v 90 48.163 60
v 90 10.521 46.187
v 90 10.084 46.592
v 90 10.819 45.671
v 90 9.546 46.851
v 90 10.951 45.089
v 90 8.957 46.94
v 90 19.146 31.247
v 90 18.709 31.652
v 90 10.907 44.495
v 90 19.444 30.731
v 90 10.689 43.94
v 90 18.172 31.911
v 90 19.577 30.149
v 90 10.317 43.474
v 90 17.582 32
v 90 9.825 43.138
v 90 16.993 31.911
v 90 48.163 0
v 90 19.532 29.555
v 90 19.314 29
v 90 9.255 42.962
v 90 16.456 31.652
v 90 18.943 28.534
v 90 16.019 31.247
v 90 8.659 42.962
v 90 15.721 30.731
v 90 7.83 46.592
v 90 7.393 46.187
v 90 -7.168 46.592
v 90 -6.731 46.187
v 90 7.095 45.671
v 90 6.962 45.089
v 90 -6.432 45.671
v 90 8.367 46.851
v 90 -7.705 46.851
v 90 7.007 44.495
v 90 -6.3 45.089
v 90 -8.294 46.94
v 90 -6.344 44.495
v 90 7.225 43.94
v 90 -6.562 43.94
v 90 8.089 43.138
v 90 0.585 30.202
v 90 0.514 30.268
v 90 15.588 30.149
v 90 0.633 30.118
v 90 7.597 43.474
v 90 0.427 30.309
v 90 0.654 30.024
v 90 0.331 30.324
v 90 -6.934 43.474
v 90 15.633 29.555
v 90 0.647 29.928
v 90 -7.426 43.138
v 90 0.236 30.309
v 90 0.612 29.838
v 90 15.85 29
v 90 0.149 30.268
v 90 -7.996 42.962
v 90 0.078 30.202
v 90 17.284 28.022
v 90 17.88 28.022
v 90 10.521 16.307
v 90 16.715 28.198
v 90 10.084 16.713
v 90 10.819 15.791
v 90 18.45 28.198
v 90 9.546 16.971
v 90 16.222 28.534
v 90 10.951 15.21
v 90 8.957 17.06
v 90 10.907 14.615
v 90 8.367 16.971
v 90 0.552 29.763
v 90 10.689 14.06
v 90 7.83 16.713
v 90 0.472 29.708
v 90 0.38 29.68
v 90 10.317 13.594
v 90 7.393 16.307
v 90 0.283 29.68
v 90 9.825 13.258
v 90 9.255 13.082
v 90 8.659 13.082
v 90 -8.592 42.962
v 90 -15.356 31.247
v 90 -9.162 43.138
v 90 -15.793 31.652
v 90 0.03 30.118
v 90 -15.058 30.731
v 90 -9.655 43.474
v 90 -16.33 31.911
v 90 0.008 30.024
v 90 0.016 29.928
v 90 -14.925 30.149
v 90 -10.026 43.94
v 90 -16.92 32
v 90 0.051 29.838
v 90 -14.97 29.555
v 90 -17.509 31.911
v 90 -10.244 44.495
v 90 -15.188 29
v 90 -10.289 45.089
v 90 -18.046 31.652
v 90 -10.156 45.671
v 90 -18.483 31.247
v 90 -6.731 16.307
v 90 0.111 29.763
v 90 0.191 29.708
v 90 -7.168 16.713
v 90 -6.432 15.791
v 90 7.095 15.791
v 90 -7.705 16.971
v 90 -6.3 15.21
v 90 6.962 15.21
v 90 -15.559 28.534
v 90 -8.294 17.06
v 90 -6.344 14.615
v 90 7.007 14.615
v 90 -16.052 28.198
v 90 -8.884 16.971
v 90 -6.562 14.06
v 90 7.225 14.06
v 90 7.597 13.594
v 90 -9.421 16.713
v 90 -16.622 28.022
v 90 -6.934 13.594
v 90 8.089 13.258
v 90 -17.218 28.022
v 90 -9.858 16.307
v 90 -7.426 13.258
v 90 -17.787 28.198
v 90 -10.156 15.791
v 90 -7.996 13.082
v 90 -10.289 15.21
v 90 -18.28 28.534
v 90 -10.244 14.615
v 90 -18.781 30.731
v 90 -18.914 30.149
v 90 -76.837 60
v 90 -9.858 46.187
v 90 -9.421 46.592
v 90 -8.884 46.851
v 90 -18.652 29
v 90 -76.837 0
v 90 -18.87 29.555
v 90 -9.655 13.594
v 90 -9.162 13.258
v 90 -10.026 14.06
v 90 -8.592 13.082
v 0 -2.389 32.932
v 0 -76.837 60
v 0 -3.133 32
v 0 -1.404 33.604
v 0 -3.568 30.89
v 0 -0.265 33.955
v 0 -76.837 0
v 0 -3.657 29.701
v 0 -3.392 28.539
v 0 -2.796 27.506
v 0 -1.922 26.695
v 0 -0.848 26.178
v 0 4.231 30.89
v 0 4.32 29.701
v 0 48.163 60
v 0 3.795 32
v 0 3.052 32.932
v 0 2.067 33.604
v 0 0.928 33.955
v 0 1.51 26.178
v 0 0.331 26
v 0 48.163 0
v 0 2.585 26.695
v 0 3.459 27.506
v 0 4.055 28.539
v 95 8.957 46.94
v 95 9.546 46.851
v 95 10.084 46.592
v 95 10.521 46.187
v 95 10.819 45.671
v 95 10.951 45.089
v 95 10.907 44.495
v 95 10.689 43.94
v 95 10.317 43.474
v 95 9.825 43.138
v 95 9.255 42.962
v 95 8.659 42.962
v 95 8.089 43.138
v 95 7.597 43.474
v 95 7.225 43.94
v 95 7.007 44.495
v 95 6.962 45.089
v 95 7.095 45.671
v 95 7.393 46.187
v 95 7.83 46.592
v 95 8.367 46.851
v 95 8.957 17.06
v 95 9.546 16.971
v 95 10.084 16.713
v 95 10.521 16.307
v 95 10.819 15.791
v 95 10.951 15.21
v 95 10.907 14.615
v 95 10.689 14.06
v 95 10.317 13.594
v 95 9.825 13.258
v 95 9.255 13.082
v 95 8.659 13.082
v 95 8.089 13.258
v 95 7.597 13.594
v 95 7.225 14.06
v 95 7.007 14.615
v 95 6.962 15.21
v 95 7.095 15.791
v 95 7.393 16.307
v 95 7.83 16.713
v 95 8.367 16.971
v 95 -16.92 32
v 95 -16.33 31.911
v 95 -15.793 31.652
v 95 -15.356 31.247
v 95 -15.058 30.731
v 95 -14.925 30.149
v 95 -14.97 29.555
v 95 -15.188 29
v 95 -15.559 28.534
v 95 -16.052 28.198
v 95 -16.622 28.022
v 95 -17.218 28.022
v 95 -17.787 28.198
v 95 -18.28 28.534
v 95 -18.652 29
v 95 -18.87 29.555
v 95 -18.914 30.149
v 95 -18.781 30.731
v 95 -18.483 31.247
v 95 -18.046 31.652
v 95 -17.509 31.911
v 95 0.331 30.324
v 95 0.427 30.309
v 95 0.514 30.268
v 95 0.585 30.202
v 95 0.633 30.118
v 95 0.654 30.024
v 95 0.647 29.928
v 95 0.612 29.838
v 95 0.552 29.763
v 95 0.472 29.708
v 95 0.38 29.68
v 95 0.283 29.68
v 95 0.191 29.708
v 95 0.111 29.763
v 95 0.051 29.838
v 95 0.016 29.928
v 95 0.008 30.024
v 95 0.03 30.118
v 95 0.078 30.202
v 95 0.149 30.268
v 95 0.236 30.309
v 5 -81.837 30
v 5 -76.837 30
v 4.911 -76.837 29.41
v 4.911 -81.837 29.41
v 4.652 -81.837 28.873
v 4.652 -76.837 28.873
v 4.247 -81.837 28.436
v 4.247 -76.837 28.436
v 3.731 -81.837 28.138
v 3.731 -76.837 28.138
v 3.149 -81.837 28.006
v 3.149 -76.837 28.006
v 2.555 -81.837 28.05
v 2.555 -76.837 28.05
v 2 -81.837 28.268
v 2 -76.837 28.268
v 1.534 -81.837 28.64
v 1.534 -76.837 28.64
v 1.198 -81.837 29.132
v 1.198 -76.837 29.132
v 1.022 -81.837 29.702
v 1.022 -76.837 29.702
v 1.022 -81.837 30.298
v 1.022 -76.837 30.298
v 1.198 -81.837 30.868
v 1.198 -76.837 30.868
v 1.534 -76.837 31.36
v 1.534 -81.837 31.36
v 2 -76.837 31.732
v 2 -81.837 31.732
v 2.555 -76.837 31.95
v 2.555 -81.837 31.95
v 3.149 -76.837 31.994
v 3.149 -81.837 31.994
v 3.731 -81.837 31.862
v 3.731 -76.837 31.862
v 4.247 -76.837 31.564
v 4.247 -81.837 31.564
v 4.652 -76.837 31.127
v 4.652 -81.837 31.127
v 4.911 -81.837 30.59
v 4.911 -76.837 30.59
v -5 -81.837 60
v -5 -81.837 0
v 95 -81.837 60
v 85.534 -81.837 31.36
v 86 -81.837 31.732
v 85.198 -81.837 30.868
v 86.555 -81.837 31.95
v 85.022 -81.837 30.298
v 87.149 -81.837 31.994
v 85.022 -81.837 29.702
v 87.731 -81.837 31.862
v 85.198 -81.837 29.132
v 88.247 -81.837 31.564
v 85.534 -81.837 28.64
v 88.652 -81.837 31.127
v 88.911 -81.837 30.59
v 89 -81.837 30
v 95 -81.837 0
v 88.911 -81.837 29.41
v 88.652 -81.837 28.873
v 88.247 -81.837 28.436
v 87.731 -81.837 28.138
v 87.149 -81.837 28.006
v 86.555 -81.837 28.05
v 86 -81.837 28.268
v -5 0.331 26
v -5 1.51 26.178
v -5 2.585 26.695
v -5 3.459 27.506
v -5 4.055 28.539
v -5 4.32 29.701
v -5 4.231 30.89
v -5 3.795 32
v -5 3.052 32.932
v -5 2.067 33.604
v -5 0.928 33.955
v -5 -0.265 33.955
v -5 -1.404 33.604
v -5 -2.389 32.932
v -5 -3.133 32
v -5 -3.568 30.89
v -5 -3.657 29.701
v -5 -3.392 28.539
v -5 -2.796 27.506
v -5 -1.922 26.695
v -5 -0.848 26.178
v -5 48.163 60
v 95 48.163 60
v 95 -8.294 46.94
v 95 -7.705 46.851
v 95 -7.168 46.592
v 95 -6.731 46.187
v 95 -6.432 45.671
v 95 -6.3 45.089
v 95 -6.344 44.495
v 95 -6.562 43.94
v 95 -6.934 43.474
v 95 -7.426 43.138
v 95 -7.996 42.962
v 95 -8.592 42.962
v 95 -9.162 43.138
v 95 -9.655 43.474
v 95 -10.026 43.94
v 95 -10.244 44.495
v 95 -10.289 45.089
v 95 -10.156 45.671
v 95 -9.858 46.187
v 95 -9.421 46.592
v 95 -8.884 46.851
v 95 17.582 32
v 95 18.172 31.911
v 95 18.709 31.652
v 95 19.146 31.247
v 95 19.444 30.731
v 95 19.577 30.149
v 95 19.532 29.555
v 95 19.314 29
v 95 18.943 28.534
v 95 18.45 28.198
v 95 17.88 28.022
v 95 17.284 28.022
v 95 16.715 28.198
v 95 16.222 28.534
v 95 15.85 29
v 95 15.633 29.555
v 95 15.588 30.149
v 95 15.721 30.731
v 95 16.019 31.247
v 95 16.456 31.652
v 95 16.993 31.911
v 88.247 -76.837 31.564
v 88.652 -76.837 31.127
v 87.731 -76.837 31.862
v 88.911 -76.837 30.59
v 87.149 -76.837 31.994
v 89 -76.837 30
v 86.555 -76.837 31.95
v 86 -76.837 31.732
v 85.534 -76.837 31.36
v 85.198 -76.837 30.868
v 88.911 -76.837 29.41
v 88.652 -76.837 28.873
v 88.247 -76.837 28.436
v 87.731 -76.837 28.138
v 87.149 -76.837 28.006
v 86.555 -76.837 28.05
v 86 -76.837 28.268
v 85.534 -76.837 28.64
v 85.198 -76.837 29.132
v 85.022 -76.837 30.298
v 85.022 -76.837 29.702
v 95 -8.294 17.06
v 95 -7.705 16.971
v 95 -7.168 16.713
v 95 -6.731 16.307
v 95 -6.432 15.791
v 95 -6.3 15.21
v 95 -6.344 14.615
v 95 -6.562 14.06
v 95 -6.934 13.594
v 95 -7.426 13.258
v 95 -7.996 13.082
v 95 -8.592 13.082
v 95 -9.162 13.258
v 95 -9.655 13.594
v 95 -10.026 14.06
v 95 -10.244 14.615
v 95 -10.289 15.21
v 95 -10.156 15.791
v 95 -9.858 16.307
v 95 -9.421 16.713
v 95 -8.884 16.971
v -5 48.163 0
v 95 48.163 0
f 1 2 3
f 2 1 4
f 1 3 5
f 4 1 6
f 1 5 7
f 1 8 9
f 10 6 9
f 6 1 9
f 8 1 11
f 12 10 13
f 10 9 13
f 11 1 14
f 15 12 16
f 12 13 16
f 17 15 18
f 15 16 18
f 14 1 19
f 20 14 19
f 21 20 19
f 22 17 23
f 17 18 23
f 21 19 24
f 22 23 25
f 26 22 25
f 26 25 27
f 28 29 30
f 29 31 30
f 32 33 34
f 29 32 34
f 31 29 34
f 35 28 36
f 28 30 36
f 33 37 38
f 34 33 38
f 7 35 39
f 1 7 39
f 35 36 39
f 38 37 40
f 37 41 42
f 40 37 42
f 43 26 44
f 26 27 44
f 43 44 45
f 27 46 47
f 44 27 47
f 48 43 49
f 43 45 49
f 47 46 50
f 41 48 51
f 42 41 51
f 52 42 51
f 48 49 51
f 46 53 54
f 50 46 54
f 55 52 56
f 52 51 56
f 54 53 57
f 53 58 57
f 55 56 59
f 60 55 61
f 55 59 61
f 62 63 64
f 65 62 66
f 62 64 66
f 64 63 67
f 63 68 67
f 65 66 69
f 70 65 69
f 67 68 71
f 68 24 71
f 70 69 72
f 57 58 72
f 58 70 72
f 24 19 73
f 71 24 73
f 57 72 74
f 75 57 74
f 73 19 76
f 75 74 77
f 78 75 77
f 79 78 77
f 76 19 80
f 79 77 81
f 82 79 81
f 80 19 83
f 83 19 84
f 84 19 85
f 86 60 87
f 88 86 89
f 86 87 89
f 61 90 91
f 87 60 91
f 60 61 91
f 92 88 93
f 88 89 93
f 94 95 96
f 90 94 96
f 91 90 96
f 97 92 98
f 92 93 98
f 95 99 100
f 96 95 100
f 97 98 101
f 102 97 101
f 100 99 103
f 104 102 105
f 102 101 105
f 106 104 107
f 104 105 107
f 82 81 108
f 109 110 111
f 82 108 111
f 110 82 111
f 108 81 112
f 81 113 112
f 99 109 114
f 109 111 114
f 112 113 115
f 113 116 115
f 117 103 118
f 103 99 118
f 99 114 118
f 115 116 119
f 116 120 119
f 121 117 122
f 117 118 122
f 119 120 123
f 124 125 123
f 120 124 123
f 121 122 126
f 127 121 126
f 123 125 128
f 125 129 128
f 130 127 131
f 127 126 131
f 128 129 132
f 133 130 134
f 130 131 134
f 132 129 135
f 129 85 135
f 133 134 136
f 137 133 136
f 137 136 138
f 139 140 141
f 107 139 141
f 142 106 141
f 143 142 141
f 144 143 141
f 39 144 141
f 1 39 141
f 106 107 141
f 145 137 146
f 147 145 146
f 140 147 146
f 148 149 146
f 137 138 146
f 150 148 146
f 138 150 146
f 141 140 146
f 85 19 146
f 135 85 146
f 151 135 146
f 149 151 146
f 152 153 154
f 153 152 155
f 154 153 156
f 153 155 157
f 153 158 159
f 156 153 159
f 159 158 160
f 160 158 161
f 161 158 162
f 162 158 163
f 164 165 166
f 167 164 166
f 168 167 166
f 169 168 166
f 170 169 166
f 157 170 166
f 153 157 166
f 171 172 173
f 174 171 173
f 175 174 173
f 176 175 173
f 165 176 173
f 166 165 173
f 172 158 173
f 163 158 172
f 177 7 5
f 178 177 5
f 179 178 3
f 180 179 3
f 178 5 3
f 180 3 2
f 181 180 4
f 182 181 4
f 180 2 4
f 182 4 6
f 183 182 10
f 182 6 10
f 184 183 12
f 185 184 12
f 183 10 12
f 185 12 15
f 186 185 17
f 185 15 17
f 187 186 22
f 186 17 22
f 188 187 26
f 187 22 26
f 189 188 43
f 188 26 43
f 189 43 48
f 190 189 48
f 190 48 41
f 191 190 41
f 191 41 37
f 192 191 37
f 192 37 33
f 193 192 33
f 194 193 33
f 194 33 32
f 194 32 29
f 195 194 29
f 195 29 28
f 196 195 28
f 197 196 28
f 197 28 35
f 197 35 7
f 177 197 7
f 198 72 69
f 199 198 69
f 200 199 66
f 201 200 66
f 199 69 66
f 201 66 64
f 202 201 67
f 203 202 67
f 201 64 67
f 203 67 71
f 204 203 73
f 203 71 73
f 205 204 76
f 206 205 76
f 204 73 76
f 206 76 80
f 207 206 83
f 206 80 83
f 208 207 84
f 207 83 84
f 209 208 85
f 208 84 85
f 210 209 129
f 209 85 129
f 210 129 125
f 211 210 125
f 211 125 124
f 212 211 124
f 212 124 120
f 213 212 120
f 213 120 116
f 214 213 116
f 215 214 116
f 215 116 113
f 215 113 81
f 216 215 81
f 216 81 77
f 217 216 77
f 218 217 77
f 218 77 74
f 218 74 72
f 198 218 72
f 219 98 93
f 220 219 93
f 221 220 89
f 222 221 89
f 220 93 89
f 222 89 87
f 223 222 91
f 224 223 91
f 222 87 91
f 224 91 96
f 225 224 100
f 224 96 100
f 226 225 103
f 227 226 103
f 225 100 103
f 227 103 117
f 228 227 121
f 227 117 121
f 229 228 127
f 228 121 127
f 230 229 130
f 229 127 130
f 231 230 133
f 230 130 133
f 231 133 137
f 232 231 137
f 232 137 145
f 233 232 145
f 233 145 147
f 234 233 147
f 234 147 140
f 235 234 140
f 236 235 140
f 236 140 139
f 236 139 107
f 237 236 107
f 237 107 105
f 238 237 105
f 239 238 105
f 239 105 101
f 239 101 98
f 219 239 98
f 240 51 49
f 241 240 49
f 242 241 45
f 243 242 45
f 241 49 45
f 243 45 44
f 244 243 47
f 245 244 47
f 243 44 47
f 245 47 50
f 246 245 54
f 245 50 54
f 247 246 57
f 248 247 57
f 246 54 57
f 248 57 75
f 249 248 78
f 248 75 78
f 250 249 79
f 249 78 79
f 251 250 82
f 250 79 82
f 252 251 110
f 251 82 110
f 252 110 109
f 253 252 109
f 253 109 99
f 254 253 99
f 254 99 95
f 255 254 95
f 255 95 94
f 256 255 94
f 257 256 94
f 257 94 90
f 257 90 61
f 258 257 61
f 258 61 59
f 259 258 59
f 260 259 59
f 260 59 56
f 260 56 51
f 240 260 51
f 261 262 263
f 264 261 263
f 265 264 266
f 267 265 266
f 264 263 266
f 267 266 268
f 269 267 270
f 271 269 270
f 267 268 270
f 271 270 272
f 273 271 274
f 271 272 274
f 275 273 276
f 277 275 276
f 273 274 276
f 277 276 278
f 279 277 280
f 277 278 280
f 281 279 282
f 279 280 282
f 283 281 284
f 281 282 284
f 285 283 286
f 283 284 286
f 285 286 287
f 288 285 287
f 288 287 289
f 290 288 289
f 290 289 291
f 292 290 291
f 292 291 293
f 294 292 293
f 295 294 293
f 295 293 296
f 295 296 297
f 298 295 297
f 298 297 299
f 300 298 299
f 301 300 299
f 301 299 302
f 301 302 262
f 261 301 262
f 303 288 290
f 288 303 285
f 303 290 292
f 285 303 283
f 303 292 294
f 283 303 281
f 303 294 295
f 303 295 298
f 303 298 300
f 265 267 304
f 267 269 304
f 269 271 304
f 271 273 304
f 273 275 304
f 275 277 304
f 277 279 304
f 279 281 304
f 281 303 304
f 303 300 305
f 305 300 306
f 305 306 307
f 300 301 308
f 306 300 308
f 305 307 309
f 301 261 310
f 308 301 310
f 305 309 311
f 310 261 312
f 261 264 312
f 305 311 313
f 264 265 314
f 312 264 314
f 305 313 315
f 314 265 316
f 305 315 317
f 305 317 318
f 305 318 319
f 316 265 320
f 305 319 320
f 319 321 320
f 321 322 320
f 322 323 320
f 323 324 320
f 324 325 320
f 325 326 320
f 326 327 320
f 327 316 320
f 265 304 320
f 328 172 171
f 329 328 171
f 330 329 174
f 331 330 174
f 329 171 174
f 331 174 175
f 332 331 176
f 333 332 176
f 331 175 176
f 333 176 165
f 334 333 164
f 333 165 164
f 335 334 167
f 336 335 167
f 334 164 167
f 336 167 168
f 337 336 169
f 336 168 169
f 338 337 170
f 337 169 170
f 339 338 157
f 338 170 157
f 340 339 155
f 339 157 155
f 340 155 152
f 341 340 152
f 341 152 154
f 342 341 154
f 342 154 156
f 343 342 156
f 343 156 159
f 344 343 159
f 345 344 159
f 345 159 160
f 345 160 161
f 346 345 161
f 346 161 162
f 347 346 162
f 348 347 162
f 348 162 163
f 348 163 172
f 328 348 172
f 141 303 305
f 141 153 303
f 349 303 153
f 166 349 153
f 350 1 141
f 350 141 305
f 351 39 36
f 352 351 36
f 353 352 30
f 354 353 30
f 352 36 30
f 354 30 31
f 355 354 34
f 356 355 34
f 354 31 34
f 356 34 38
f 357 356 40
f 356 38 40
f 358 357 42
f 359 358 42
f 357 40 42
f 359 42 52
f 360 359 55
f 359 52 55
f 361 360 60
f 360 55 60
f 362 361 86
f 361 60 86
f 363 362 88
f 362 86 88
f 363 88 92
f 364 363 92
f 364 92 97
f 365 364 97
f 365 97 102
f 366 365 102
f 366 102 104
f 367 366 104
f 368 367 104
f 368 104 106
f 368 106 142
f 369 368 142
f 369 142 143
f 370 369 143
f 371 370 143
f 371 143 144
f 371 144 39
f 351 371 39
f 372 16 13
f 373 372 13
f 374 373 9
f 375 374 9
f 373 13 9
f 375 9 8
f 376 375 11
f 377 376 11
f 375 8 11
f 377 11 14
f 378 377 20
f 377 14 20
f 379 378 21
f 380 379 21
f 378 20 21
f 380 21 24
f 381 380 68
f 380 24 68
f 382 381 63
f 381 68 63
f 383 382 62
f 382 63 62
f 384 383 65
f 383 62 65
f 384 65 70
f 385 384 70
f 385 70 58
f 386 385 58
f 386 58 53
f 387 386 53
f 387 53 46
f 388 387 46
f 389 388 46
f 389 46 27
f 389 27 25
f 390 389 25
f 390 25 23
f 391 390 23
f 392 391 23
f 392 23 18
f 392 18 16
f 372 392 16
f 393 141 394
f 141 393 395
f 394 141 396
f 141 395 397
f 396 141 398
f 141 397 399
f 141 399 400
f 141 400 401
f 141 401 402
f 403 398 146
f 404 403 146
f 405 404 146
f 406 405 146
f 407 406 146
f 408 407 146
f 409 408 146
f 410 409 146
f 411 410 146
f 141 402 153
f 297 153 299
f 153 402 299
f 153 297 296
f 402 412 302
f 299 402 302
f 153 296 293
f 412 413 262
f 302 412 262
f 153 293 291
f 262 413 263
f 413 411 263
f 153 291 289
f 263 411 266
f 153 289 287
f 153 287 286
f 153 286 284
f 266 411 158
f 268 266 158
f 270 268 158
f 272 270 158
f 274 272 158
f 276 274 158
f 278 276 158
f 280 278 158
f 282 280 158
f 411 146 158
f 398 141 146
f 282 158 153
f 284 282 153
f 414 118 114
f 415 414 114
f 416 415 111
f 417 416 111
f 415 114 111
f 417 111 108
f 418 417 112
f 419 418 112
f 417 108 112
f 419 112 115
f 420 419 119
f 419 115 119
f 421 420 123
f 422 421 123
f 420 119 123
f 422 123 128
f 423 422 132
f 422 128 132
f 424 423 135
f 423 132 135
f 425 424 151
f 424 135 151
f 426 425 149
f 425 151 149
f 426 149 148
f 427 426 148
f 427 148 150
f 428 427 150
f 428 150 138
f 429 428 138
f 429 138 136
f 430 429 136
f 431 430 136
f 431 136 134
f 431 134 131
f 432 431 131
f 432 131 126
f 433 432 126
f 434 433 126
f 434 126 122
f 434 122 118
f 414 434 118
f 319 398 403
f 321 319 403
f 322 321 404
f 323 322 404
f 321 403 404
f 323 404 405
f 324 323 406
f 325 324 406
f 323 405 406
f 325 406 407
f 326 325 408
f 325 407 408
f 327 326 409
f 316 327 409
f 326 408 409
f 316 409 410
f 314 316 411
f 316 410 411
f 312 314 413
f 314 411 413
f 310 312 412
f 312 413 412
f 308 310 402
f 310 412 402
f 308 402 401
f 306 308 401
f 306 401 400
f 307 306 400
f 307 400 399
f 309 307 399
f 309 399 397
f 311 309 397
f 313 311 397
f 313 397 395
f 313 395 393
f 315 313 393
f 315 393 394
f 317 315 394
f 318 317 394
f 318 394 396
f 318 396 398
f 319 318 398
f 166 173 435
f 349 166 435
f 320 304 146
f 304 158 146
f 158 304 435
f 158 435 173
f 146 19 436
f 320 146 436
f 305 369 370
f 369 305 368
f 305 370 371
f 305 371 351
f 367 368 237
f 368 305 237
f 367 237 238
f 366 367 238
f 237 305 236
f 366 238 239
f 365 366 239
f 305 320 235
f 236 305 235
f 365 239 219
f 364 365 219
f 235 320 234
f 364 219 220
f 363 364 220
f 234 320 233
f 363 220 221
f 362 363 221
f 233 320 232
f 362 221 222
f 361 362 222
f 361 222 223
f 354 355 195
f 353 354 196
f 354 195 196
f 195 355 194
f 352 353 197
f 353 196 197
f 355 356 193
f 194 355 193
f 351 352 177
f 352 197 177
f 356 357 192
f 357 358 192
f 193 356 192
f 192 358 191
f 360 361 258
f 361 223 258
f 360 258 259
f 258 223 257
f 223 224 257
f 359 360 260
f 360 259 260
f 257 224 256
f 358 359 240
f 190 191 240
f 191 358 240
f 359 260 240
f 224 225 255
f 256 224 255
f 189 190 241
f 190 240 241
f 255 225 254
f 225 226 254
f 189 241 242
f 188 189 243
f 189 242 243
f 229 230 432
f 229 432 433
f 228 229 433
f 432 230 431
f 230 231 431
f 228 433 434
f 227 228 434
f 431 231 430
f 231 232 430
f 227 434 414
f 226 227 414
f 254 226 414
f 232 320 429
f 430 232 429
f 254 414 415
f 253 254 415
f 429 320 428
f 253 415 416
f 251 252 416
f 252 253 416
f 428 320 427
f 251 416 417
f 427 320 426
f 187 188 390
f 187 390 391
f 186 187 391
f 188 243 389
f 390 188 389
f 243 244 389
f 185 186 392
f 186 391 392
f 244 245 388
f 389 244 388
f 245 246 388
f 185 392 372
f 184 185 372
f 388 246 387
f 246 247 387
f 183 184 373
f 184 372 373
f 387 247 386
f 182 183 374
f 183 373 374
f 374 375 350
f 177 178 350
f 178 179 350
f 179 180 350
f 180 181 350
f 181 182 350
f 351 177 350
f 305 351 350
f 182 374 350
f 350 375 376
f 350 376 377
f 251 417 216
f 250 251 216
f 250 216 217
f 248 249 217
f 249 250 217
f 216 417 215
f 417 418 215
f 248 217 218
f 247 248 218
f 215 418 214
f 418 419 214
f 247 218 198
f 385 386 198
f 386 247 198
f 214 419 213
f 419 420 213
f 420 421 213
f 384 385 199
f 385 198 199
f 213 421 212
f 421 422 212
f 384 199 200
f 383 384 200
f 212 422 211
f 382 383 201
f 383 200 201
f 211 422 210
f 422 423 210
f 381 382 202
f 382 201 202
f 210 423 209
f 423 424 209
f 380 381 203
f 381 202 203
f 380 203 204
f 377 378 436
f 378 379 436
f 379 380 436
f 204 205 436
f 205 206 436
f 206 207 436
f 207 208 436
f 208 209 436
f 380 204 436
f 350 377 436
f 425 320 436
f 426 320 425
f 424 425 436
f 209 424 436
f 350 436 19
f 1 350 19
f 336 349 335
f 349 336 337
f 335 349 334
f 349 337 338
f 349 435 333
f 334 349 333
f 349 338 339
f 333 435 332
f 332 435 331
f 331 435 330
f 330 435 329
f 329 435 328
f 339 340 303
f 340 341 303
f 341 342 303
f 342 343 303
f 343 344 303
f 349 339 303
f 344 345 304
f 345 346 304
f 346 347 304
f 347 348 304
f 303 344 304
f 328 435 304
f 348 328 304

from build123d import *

# Parameters (mm, degrees)
EXTRUDE_1_DEPTH     = 60
SKETCH_2_R          = 2
CUT_EXTRUDE_1_DEPTH = 6
SKETCH_3_R          = 2
SKETCH_3_R_2        = 0.32384185
CUT_EXTRUDE_2_DEPTH = 10
SKETCH_5_R          = 4
SKETCH_5_R_2        = 0.32384185
CUT_EXTRUDE_4_DEPTH = 6


with BuildPart() as part:
    # 草图1 → 凸台-拉伸1 (new body)
    with BuildSketch(Plane.XY):
        Polygon((95, -81.837278389), (95, 48.162721611), (90, 48.162721611), (90, -76.837278389), (0, -76.837278389), (0, 48.162721611), (-5, 48.162721611), (-5, -81.837278389), align=None)
    extrude(amount=EXTRUDE_1_DEPTH)

    # 草图2 → 切除-拉伸1 (cut, through all)
    with BuildSketch(Plane(origin=(0, -76.837278389, 0), x_dir=(1, 0, 0), z_dir=(0, 1, 0))):
        with Locations((3, -30)):
            Circle(SKETCH_2_R)
        with Locations((87, -30)):
            Circle(SKETCH_2_R)
    extrude(amount=-CUT_EXTRUDE_1_DEPTH, mode=Mode.SUBTRACT)

    # 草图3 → 切除-拉伸2 (cut)
    with BuildSketch(Plane.ZY.offset(-90)):
        with Locations((30, 17.582413023)):
            Circle(SKETCH_3_R)
        with Locations((15.060150537, 8.956886914)):
            Circle(SKETCH_3_R)
        with Locations((15.060150537, -8.294165304)):
            Circle(SKETCH_3_R)
        with Locations((30, -16.919691412)):
            Circle(SKETCH_3_R)
        with Locations((44.939849463, -8.294165304)):
            Circle(SKETCH_3_R)
        with Locations((44.939849463, 8.956886914)):
            Circle(SKETCH_3_R)
        with Locations((30, 0.331360805)):
            Circle(SKETCH_3_R_2)
    extrude(amount=-CUT_EXTRUDE_2_DEPTH, mode=Mode.SUBTRACT)

    # 草图5 → 切除-拉伸4 (cut, through all)
    with BuildSketch(Plane(origin=(0, 0, 0), x_dir=(0, 0, -1), z_dir=(1, 0, 0))):
        with Locations((-30, 0.331360805)):
            Circle(SKETCH_5_R)
        with Locations((-30, 0.331360805)):
            Circle(SKETCH_5_R_2, mode=Mode.SUBTRACT)
        with Locations((-30, 0.331360805)):
            Circle(SKETCH_5_R_2)
    extrude(amount=-CUT_EXTRUDE_4_DEPTH, mode=Mode.SUBTRACT)


solid = part.part
